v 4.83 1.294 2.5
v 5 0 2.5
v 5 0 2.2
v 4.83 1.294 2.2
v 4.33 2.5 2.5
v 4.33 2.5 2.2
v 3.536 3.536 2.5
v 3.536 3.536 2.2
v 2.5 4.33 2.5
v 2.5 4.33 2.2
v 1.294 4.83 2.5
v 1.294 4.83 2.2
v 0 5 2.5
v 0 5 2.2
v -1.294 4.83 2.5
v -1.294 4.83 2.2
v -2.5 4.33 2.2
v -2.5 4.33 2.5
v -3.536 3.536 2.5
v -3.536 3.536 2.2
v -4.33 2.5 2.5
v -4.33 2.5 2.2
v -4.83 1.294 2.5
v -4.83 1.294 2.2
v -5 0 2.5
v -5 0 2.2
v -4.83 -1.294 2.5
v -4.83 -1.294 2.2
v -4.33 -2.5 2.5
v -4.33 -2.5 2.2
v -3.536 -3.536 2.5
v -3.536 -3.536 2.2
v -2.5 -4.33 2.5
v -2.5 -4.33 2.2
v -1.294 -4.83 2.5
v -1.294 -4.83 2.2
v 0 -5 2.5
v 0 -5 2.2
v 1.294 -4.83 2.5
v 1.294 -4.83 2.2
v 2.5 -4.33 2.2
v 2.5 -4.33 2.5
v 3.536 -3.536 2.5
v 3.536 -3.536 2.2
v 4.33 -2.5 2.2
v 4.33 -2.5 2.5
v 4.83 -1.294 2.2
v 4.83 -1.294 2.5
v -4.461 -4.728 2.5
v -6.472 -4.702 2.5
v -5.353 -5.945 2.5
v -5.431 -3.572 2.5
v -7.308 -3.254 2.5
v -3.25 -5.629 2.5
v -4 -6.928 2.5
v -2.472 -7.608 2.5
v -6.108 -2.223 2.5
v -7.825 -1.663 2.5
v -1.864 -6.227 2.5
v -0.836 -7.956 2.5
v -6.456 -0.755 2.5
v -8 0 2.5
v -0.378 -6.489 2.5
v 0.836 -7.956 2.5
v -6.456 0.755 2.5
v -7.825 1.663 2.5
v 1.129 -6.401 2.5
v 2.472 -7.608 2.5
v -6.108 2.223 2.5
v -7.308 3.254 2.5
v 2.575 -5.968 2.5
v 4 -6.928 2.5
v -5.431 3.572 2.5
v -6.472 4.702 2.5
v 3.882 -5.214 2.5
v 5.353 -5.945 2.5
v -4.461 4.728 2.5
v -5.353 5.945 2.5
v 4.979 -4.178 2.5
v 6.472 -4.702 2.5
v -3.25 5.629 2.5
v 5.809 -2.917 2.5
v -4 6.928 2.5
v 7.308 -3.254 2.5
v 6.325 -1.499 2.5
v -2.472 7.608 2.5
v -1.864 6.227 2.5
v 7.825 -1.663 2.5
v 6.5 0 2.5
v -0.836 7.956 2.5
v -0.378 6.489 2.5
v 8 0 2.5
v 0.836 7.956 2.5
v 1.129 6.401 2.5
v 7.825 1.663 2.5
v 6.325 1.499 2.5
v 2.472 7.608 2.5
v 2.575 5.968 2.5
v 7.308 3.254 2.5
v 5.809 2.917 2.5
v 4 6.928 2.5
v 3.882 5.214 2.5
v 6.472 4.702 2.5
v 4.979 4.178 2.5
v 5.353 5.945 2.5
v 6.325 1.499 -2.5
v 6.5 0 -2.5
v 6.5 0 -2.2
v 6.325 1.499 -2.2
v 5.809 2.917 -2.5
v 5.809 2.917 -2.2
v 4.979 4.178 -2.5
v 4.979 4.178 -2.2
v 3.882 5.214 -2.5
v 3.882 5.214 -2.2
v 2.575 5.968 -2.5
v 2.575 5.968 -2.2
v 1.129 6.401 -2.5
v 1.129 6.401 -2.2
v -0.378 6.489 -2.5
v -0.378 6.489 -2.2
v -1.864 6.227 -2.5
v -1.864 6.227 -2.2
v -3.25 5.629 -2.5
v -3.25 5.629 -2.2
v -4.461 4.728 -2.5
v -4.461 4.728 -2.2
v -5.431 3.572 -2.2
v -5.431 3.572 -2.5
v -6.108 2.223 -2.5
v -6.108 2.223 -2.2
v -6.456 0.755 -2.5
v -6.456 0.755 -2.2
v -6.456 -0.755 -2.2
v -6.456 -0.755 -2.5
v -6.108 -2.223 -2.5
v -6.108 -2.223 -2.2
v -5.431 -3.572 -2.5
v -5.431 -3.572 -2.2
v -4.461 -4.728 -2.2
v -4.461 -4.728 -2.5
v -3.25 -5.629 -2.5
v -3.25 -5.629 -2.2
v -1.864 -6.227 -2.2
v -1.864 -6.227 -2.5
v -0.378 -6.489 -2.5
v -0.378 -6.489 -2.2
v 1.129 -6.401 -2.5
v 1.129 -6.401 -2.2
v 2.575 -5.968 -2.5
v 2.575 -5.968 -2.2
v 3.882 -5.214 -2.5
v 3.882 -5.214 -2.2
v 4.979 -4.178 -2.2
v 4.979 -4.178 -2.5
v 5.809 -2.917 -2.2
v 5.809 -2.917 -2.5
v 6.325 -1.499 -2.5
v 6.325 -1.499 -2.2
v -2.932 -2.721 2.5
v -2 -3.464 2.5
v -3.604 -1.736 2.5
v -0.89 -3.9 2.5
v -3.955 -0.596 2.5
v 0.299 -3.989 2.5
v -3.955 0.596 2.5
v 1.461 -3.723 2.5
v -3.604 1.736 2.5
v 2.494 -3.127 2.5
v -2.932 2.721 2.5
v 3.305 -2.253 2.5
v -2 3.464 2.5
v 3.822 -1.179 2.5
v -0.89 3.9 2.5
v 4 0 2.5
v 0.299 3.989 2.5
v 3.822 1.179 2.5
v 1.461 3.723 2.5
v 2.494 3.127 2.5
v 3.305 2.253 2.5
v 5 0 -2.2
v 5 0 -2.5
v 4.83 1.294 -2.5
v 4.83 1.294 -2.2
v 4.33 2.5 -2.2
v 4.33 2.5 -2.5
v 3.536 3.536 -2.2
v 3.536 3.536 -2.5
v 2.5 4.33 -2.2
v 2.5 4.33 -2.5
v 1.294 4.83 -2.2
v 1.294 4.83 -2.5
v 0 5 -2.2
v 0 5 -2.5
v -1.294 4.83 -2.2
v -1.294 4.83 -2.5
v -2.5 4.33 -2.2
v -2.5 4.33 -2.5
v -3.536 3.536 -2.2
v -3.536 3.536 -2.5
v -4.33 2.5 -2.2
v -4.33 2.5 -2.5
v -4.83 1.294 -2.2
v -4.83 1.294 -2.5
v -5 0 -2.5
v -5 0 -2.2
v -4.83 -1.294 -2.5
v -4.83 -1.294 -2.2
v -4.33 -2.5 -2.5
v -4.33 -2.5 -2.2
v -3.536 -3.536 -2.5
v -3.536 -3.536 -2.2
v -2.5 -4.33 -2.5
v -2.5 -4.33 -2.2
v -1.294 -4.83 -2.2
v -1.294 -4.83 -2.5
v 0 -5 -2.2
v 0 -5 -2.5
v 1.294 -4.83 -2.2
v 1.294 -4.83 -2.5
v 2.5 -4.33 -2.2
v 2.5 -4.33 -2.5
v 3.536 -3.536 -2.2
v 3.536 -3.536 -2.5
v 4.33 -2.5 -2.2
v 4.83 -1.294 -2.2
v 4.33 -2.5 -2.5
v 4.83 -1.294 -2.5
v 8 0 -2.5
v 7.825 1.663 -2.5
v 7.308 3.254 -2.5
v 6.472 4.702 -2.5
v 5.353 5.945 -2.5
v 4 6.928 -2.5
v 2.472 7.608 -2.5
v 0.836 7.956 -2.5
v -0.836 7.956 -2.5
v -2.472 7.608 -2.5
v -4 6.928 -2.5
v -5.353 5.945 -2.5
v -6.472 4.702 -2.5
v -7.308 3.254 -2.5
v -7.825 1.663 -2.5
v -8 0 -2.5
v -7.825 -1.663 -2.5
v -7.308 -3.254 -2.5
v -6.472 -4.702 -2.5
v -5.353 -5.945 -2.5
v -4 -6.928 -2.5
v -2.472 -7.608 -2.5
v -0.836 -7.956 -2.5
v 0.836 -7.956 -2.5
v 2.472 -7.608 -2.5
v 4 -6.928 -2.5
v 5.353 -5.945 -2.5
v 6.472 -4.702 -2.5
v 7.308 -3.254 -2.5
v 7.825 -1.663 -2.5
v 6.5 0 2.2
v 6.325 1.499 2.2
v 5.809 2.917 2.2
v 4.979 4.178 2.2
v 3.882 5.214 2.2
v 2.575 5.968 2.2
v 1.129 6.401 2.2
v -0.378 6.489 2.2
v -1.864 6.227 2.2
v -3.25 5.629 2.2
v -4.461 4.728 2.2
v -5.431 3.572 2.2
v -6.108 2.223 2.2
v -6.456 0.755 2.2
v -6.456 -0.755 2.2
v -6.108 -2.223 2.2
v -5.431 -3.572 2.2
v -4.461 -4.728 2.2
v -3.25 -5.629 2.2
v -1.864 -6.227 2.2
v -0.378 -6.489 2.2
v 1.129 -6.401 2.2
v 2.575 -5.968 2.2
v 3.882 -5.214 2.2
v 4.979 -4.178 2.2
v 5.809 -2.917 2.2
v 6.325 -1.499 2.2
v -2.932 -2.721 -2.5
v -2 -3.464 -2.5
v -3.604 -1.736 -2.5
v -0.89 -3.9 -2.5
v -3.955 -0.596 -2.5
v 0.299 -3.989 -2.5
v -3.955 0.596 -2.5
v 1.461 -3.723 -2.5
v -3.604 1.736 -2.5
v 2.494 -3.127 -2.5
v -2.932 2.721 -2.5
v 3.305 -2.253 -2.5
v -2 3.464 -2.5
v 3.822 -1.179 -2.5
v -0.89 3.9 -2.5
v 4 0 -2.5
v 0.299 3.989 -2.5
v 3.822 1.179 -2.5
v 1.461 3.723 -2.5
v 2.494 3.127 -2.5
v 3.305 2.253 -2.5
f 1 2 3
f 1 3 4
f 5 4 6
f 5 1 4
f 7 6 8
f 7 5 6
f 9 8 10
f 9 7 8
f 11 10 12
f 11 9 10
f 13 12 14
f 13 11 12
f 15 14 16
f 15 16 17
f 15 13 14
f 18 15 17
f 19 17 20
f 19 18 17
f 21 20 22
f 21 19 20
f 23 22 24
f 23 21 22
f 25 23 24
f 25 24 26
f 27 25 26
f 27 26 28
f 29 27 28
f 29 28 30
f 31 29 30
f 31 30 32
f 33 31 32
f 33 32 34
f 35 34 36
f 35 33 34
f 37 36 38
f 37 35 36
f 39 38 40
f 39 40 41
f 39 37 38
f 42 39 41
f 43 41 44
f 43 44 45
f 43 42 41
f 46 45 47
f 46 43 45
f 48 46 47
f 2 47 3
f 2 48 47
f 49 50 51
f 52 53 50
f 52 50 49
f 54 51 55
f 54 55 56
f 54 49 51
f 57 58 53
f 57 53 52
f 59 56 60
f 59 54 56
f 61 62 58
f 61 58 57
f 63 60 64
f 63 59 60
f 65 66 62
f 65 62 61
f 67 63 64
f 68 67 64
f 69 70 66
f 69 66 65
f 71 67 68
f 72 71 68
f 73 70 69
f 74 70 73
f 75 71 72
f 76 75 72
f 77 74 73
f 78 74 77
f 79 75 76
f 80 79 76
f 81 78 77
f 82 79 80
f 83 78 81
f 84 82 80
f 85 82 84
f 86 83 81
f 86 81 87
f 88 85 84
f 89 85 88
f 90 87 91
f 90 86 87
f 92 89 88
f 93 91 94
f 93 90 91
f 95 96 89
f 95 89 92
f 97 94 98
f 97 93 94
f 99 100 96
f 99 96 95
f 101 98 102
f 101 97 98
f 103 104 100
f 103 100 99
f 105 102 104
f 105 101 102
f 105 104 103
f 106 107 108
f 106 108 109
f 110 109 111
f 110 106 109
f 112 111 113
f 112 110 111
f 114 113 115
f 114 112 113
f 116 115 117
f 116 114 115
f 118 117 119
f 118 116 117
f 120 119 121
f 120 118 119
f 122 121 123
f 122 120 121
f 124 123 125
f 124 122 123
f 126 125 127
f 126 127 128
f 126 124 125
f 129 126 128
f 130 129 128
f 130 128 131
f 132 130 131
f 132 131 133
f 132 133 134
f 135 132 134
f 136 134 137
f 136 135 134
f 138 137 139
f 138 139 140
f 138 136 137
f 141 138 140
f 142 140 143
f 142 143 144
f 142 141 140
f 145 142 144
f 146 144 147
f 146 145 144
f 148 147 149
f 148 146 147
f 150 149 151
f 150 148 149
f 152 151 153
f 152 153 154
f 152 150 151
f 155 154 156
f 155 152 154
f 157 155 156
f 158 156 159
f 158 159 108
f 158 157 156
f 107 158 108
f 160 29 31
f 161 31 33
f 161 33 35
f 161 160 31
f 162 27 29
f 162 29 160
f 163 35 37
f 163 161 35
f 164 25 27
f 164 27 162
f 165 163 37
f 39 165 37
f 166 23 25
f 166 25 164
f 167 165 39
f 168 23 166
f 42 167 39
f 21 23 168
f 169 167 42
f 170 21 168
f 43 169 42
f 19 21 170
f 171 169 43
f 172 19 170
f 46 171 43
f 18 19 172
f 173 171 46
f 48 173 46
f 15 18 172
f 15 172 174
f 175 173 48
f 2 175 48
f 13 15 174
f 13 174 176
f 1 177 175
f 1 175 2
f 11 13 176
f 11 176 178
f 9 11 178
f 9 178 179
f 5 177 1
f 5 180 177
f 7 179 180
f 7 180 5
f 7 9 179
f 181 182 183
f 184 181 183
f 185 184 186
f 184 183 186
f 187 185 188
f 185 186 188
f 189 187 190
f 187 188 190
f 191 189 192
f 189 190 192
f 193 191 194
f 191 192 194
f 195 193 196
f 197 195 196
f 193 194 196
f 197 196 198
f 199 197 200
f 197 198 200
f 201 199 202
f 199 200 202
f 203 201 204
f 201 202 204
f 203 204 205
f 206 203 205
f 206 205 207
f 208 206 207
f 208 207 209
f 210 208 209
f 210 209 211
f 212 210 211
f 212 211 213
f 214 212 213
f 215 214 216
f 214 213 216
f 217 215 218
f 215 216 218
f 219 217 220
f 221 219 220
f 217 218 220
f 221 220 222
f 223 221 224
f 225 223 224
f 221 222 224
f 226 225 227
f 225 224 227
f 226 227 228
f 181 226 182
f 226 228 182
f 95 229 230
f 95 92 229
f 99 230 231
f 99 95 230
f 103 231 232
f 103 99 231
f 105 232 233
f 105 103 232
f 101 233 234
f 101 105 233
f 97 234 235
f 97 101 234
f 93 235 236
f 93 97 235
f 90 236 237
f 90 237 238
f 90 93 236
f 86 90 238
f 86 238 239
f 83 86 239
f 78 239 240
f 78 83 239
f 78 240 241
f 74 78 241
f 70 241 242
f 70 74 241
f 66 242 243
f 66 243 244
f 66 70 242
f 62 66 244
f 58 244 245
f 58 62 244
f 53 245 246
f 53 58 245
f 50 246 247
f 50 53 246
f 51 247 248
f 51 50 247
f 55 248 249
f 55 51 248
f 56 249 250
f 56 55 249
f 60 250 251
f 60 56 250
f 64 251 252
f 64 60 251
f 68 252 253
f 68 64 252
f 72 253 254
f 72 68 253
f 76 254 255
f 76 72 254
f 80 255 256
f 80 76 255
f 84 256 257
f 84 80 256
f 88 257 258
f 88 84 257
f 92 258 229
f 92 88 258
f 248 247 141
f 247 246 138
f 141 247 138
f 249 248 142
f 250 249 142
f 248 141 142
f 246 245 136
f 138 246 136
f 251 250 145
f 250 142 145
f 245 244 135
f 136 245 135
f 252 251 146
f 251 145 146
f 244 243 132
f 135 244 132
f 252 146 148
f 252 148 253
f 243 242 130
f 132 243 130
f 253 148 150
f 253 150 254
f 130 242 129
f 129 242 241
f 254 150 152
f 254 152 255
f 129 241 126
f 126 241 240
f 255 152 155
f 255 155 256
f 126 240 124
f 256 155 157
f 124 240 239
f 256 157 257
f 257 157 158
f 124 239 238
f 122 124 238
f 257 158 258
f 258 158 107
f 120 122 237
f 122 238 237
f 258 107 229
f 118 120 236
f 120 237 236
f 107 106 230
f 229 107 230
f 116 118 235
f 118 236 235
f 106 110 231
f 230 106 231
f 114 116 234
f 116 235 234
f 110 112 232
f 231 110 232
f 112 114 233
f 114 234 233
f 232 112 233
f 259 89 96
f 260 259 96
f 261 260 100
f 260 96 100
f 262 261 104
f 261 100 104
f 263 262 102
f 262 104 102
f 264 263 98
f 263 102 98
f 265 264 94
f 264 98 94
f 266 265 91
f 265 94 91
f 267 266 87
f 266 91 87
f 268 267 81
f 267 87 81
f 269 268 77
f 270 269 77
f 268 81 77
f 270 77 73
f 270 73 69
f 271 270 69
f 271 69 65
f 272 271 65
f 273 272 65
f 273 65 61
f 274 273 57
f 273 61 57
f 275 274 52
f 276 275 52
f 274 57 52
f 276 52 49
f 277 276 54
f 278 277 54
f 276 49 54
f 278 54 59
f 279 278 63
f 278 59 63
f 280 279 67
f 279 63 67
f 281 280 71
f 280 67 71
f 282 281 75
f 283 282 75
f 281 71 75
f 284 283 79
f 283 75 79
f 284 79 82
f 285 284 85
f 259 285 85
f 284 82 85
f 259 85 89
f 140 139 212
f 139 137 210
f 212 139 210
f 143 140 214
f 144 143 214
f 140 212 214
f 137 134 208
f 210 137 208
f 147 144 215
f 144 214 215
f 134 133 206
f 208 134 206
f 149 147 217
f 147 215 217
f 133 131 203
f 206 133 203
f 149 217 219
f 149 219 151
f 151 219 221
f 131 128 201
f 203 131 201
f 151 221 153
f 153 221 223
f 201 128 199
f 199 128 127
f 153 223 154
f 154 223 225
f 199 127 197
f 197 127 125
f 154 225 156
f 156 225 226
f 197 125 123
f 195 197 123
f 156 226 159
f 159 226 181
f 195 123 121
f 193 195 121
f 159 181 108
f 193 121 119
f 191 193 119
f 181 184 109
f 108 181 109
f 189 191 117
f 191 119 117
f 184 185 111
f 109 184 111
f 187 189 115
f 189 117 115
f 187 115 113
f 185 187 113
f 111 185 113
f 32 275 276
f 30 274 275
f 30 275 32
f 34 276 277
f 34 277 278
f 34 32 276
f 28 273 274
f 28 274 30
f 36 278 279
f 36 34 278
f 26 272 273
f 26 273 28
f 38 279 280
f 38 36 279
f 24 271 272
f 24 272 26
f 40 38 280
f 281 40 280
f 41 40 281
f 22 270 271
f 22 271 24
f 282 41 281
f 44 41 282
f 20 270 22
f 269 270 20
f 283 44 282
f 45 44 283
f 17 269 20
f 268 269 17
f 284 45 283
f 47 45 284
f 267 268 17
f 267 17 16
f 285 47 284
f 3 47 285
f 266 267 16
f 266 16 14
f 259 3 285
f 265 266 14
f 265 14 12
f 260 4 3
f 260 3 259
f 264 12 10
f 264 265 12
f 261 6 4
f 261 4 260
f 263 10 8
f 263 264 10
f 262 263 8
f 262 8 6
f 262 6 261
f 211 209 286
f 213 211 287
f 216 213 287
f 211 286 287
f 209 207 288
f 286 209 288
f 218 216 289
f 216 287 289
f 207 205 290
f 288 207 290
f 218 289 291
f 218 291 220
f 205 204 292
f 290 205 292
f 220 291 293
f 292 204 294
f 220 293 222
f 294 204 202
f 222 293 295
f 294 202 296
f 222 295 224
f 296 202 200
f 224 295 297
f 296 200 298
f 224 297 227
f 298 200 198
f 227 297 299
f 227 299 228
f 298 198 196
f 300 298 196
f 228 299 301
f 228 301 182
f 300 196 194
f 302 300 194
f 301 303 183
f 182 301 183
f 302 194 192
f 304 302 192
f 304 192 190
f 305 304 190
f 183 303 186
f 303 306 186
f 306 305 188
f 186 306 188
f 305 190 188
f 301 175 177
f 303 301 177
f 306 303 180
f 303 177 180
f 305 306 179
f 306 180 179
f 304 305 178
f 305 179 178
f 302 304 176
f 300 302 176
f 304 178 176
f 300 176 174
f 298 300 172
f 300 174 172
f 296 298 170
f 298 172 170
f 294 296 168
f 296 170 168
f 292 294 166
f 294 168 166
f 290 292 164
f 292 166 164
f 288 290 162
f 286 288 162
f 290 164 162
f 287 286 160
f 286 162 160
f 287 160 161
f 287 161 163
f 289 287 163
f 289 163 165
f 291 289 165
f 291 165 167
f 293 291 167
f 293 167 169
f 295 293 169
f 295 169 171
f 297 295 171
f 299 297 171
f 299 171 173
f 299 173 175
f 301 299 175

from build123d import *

# Parameters (mm, degrees)
BODY_DEPTH       = 2.5
BODY_DEPTH_BACK  = 2.5
SKETCH1_R        = 8
SKETCH3_R        = 4
BORE_HOLE_DEPTH  = 13.369316877
SKETCH4_R        = 6.5
SKETCH4_R_2      = 5
DECORATION_DEPTH = 0.3


with BuildPart() as part:
    # Sketch1 → Body (new, two sides: drawn at the far end of the back side and taken through both)
    with BuildSketch(Plane.XY.offset(-BODY_DEPTH_BACK)):
        Circle(SKETCH1_R)
    extrude(amount=BODY_DEPTH + BODY_DEPTH_BACK)

    # Sketch3 → Bore-Hole (cut, through all)
    with BuildSketch(Plane.XY.offset(2.5)):
        Circle(SKETCH3_R)
    extrude(amount=-BORE_HOLE_DEPTH, mode=Mode.SUBTRACT)

    # Sketch4 → Decoration (cut)
    with BuildSketch(Plane.XY.offset(2.5)):
        Circle(SKETCH4_R)
        Circle(SKETCH4_R_2, mode=Mode.SUBTRACT)
    decoration = extrude(amount=-DECORATION_DEPTH, mode=Mode.SUBTRACT)

    # Mirror1: Decoration across plane
    add(decoration.mirror(Plane.XY), mode=Mode.SUBTRACT)


solid = part.part
